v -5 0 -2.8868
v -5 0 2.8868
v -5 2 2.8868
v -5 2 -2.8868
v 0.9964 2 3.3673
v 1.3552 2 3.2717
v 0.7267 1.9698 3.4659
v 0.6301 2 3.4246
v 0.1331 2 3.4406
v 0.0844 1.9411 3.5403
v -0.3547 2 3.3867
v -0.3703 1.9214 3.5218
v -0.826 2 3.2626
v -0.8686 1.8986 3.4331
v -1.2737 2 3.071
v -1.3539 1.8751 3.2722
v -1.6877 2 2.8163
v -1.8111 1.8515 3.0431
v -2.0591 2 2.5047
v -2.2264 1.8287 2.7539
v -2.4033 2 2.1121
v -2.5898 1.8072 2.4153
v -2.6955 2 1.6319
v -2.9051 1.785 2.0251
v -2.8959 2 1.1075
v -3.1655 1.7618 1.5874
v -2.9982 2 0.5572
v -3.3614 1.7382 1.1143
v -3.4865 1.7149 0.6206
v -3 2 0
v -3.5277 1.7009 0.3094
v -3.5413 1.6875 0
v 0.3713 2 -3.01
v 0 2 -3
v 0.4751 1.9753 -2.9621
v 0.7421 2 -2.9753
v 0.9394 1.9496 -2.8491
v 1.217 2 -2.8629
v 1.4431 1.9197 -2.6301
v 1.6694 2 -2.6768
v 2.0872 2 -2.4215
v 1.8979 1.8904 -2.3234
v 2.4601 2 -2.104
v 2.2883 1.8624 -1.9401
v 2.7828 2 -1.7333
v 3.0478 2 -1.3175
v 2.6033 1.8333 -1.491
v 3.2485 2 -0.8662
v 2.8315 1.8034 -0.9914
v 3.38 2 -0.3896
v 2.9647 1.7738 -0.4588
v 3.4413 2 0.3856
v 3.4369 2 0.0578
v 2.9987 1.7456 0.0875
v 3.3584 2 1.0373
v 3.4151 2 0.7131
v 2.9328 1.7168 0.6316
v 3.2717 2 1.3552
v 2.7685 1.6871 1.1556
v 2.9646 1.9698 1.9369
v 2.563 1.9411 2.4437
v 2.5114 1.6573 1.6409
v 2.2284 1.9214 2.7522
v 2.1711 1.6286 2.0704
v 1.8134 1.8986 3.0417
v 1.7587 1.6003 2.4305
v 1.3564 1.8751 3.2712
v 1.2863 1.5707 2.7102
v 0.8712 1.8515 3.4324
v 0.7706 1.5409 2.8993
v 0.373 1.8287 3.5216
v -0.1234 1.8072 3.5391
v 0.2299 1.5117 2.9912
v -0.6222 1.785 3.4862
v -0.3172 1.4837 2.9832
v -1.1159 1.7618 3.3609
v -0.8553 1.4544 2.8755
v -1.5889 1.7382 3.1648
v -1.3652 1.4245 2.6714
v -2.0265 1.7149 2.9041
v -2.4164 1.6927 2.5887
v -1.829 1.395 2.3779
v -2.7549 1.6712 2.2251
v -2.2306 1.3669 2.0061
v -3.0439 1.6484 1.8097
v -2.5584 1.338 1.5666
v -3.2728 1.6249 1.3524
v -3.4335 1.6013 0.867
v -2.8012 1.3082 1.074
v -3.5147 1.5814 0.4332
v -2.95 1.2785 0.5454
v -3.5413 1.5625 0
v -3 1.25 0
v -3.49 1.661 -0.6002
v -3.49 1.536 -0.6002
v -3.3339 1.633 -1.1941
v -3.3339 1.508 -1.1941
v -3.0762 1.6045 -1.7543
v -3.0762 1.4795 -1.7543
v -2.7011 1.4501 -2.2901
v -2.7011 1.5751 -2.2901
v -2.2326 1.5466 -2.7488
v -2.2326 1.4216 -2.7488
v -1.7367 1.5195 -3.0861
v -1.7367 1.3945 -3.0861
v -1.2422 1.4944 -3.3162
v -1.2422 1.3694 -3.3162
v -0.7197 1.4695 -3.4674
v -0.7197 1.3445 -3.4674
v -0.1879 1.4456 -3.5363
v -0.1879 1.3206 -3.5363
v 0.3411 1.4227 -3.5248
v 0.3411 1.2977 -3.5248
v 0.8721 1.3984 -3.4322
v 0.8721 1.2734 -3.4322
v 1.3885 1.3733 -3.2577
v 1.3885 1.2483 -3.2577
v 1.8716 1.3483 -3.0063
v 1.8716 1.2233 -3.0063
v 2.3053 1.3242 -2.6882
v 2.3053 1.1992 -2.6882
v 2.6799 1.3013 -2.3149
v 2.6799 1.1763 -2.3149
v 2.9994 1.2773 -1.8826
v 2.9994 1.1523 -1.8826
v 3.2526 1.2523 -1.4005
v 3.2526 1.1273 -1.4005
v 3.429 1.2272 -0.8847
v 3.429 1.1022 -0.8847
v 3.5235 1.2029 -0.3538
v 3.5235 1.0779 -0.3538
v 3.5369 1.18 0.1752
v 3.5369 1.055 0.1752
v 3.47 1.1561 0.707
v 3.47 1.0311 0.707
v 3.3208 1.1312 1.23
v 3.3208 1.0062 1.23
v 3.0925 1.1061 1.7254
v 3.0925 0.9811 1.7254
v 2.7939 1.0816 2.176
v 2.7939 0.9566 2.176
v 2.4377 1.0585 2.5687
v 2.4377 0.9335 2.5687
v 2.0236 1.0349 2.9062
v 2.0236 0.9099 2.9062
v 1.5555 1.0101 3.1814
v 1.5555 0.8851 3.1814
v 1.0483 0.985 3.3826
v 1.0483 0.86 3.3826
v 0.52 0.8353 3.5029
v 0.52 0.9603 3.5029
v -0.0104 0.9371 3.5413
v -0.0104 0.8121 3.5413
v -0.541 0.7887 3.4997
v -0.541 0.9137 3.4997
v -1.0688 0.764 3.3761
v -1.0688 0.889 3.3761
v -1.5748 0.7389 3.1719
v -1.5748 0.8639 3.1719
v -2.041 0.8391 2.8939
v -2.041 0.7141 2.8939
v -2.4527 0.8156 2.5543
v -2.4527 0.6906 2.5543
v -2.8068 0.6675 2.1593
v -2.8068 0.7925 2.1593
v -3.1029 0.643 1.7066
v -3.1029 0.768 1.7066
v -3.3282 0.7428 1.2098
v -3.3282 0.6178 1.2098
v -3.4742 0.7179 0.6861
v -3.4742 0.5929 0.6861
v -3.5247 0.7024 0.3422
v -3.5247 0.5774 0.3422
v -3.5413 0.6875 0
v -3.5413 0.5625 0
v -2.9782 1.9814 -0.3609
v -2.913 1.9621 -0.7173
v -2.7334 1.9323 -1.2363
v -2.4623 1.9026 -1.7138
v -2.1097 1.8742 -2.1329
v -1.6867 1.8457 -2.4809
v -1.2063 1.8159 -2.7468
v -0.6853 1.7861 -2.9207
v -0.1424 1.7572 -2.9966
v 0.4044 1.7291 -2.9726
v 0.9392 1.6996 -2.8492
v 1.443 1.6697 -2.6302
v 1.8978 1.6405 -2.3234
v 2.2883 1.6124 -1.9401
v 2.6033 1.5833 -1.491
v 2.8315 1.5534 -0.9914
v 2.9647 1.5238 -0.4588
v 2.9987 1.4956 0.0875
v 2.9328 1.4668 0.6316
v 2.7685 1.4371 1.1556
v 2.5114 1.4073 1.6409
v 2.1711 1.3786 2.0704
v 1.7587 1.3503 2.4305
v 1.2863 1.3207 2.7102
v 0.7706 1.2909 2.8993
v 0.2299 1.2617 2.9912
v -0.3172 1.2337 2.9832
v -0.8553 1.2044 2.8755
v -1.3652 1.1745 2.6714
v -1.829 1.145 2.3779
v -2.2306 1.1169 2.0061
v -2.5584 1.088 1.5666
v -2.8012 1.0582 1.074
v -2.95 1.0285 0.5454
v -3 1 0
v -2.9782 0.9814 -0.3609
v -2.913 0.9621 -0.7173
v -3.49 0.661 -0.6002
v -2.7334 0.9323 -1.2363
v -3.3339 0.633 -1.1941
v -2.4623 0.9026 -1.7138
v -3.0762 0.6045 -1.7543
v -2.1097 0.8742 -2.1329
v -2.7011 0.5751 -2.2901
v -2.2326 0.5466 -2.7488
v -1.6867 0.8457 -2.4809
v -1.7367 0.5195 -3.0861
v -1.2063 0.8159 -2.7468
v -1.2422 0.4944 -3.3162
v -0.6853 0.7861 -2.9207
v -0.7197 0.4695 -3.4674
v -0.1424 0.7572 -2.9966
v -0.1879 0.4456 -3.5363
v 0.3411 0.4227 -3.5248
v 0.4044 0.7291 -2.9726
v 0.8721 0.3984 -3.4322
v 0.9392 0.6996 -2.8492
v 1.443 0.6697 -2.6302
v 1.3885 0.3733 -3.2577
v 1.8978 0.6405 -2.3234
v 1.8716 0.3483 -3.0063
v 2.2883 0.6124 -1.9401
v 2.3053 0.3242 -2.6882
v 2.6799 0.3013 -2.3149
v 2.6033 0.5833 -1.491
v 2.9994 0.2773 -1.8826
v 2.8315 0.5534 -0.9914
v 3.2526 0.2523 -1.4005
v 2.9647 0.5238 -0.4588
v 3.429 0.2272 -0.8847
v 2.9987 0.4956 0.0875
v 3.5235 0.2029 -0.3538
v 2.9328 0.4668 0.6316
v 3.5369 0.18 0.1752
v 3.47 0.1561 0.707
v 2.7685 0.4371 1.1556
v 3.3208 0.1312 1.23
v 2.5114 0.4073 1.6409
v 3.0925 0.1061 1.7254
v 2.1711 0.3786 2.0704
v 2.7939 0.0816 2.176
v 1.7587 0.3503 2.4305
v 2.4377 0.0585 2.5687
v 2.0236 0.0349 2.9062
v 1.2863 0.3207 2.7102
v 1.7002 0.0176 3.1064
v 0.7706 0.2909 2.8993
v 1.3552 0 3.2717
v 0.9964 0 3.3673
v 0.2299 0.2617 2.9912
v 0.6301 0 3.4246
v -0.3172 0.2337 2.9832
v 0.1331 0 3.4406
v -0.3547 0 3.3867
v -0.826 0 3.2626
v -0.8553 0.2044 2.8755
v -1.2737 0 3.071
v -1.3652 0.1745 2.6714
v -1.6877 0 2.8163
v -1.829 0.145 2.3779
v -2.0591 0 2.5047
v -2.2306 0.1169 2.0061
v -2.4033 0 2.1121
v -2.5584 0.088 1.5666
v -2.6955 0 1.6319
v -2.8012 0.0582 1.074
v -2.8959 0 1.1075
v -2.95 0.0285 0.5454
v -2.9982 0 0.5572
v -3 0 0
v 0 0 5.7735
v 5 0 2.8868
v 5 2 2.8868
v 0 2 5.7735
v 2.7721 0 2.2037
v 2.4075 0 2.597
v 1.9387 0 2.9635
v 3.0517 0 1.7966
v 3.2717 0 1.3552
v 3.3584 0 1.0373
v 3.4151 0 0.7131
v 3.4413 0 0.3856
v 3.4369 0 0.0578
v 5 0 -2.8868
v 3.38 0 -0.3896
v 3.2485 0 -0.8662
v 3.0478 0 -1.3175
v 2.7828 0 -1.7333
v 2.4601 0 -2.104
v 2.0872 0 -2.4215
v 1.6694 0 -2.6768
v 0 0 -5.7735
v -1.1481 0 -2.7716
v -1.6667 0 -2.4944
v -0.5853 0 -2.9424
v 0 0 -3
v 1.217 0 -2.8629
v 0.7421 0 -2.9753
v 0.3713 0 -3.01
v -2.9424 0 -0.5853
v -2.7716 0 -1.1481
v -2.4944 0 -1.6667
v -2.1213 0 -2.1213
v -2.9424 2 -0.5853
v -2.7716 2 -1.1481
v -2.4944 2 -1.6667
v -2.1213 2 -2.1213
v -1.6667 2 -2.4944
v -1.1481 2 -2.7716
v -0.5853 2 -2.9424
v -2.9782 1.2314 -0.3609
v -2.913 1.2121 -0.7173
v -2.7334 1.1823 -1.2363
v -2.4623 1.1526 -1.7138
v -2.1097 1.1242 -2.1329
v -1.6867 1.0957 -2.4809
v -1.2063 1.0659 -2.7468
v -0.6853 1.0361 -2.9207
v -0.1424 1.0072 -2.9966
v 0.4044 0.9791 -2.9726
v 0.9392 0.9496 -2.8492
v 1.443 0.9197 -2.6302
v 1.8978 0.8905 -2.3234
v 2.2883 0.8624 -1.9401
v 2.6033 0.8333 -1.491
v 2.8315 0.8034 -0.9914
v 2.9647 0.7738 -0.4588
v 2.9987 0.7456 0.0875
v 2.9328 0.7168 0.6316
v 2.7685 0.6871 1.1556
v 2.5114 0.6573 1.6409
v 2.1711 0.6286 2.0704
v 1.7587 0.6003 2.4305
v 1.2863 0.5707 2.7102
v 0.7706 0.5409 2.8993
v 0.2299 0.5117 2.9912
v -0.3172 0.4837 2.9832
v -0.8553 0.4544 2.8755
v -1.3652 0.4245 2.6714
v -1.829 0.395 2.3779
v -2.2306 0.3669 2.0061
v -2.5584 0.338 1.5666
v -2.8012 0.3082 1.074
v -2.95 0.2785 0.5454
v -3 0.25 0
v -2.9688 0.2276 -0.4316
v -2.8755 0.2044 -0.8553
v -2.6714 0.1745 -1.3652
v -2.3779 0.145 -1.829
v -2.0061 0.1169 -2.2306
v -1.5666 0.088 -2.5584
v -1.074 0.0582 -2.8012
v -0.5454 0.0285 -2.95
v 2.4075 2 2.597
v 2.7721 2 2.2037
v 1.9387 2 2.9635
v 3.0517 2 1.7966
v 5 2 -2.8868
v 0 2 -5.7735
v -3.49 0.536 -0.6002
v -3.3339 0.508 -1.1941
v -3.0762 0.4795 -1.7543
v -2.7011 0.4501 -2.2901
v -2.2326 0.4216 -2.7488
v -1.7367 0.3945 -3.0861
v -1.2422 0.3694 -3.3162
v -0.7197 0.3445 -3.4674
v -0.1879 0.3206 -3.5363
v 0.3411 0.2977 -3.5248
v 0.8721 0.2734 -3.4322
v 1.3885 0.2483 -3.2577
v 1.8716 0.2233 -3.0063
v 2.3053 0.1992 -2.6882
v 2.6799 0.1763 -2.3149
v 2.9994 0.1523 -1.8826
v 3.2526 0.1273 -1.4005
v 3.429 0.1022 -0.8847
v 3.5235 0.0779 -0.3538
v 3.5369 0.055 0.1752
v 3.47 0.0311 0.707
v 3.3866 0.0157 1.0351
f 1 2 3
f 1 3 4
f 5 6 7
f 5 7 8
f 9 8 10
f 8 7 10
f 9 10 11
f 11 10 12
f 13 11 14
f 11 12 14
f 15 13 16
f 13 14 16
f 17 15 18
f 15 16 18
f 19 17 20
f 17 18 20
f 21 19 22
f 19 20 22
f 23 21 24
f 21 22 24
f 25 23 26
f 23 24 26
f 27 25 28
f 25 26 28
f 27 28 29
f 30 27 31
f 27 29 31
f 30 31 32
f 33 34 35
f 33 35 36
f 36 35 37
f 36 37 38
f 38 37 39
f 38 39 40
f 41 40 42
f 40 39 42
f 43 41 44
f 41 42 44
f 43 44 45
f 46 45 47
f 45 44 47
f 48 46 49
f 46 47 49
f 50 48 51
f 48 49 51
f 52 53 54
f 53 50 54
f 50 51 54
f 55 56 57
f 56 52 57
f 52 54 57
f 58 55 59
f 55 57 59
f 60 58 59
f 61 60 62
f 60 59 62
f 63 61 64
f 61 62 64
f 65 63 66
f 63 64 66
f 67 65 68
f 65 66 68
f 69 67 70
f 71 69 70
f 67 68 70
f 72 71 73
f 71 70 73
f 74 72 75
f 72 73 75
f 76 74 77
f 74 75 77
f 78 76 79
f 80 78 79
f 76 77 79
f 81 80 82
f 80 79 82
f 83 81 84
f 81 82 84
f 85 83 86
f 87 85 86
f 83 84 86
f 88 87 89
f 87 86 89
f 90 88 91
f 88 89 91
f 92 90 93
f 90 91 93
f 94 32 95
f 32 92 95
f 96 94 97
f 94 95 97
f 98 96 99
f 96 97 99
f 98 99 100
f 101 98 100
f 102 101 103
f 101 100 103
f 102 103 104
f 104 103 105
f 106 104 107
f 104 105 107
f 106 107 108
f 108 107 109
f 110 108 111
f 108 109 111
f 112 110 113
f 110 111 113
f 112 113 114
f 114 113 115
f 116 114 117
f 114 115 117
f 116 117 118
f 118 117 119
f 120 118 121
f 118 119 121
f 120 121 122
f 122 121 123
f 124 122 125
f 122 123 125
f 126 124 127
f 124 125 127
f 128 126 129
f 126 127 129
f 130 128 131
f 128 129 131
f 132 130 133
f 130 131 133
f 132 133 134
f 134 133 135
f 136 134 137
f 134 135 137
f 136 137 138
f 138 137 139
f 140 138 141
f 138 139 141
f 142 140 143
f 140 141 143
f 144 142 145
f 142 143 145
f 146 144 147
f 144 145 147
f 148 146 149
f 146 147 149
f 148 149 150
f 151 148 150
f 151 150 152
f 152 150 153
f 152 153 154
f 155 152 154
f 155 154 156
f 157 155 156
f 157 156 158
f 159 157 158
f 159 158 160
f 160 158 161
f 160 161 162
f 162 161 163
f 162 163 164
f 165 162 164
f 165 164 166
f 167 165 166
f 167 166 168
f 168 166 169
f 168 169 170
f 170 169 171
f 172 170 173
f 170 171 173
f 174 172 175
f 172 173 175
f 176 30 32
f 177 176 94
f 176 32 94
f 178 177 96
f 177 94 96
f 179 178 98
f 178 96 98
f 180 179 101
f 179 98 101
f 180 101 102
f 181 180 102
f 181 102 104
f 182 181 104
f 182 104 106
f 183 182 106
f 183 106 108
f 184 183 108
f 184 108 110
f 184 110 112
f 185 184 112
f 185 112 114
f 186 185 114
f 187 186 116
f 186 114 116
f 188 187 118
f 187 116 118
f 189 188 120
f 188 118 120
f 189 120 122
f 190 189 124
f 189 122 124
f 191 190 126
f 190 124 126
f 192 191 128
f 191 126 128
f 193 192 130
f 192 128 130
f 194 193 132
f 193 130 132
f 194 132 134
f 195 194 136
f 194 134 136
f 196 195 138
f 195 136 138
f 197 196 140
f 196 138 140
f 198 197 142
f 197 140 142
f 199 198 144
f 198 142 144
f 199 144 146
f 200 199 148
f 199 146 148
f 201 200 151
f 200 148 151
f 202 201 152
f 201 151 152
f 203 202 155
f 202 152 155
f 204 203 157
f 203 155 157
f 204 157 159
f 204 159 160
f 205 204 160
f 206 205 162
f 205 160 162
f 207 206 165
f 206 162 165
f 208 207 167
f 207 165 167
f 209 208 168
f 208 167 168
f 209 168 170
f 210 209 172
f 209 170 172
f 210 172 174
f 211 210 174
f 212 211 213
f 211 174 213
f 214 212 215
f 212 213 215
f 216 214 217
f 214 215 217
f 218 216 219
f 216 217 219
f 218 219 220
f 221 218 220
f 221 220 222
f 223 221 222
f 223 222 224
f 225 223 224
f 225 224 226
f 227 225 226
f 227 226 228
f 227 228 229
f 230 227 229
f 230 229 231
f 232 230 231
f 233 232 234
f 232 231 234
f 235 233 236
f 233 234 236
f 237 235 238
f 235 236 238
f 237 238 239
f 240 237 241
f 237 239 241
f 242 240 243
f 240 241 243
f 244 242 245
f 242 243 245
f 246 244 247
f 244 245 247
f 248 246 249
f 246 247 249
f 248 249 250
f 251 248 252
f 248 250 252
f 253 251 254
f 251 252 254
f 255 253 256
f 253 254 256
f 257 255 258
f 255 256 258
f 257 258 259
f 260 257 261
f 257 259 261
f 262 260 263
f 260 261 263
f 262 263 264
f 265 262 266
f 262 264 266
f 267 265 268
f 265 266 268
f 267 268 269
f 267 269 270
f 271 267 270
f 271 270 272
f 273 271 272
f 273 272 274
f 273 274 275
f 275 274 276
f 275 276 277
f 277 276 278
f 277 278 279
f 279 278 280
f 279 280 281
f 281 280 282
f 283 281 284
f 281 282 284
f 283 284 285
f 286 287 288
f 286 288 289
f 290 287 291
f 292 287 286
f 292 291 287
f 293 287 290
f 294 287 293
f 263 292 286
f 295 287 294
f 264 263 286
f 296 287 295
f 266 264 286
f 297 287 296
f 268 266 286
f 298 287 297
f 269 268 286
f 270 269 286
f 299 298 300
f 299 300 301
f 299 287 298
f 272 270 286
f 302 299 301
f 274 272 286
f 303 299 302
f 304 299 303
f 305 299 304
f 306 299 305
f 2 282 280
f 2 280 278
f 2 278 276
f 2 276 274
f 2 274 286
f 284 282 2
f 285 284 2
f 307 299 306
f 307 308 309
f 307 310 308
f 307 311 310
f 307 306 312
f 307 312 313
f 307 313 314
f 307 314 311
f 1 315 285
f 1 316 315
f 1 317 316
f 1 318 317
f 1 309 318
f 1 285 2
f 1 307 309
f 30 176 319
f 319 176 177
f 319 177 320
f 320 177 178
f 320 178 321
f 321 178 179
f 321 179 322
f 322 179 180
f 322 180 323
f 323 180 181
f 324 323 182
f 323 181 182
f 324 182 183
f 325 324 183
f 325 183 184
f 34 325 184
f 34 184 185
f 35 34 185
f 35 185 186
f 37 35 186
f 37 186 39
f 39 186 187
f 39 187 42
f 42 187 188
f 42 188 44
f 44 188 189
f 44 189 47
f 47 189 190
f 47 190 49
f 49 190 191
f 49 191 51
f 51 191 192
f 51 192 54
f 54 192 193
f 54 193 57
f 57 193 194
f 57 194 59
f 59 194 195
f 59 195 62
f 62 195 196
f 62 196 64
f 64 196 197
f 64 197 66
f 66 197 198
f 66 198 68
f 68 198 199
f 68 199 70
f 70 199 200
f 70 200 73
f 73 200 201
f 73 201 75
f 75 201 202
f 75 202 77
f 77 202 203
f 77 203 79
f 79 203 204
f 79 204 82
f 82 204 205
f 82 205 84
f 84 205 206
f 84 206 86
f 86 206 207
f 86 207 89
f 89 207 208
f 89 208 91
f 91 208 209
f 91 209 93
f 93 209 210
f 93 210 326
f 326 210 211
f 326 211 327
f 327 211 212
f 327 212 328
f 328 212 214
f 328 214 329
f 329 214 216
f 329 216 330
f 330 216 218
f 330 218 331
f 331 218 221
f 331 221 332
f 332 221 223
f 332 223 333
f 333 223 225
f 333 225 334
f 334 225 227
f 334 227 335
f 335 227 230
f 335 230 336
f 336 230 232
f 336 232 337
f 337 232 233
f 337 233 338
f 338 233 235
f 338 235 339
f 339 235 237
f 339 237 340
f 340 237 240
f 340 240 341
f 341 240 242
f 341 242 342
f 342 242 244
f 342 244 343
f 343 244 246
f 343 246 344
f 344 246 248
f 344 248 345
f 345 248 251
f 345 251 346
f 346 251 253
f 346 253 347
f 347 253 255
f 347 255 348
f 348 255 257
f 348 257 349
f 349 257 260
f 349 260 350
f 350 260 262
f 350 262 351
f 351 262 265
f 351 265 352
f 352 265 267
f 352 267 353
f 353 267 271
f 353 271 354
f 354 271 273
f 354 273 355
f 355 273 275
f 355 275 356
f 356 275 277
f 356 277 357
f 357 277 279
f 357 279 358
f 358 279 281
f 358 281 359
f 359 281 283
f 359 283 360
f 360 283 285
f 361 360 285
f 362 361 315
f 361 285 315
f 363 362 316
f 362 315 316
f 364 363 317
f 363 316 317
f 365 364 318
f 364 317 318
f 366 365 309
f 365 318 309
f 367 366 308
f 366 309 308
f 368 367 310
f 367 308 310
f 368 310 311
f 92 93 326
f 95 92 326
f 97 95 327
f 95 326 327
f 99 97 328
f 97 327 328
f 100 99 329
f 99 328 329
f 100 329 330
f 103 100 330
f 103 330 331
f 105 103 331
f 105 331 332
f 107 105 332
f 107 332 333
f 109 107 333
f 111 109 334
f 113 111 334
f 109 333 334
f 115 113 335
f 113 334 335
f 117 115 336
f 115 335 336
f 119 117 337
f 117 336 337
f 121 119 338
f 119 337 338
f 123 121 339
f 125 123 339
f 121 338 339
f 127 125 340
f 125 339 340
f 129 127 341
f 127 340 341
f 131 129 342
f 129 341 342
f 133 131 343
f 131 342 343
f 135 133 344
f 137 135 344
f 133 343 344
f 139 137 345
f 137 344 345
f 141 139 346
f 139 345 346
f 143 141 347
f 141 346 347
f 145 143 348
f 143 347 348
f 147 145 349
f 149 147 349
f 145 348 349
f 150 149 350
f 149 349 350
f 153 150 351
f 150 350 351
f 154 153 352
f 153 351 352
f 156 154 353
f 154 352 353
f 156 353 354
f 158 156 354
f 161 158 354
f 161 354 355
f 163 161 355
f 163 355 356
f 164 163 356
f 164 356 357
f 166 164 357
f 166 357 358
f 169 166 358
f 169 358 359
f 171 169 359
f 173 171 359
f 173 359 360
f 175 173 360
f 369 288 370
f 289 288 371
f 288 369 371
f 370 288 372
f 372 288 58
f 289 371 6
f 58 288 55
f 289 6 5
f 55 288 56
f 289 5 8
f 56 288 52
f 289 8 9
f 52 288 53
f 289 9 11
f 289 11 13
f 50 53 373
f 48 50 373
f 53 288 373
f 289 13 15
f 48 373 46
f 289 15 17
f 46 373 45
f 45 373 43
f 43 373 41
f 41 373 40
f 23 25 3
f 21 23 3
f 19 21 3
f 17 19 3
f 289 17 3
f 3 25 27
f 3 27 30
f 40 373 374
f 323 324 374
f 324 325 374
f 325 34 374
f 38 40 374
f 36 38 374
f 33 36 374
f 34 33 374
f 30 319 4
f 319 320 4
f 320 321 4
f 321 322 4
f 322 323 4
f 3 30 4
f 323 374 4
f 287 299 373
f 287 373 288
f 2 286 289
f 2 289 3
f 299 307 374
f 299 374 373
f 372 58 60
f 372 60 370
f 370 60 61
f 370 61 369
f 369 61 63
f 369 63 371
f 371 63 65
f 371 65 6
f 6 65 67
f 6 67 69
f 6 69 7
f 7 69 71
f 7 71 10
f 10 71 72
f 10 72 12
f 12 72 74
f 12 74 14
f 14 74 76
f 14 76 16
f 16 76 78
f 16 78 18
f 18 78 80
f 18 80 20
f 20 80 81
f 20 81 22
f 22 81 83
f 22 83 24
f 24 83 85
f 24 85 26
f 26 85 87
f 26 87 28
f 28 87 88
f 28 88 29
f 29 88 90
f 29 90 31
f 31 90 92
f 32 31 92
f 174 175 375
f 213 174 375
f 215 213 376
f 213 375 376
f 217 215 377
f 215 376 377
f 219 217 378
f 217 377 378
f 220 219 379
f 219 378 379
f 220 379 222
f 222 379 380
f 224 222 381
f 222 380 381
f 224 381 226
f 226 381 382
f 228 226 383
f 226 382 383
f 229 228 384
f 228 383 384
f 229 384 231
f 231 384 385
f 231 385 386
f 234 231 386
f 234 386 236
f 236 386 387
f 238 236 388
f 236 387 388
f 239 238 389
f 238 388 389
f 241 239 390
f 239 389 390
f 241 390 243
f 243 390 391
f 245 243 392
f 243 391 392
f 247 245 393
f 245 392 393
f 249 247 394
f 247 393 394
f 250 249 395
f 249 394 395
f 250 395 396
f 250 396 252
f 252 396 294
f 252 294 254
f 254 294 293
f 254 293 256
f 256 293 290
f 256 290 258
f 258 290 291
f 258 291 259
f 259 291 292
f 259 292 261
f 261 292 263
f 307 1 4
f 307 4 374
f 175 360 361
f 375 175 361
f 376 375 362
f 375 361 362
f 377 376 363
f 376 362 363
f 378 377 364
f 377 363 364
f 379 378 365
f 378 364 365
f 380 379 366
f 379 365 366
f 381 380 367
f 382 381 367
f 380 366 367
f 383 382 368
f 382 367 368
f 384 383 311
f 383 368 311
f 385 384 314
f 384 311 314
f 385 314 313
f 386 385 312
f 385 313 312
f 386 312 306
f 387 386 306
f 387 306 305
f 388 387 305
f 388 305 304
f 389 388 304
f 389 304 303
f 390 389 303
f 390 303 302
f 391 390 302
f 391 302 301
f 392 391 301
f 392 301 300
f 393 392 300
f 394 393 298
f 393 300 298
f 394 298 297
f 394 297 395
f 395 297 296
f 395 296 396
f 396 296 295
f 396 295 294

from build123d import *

# Parameters (mm, degrees)
SKETCH_1_R      = 2.5
EXTRUDE_1_DEPTH = 2
M7X1_02_D       = 6
M7X1_02_DEPTH   = 10
M7X1_02_TIP     = 1.802581857
THREAD_2_PITCH  = 1


with BuildPart() as part:
    # Эскиз1 → Бобышка-Вытянуть1 (new body)
    with BuildSketch(Plane(origin=(0, 0, 0), x_dir=(1, 0, 0), z_dir=(0, 1, 0))):
        Polygon((-5, -2.886751346), (-5, 2.886751346), (0, 5.773502692), (5, 2.886751346), (5, -2.886751346), (0, -5.773502692), align=None)
        with Locations(Location((0, 0, 0), (0, 0, 270))):
            Circle(SKETCH_1_R, mode=Mode.SUBTRACT)
    extrude(amount=EXTRUDE_1_DEPTH)

    # Сверление под метчик M7x1.02
    with Locations(Plane(origin=(0, 2, 0), x_dir=(1, 0, 0), z_dir=(0, 1, 0))):
        with Locations((0, 0)):
            Hole(M7X1_02_D / 2, depth=M7X1_02_DEPTH)
            with Locations((0, 0, -(M7X1_02_DEPTH + M7X1_02_TIP / 2))):  # 118° drill point
                Cone(0, M7X1_02_D / 2, M7X1_02_TIP, mode=Mode.SUBTRACT)

    # Резьба2: the profile of Профиль резьбы2 profile screwed along a right-hand helix of 5 turns, 8 arcs to a turn; built about Z, then put on its axis
    thread_2_z = Axis((0, 0, 0), (0, 0, 1))
    thread_2_corners = [(2.9997, 0, -0.000173205), (3.541265875, 0, 0.312499999), (3.541265875, 0, 0.437499999), (2.9997, 0, 0.750173202)]
    with BuildLine(mode=Mode.PRIVATE) as thread_2_profile:
        Line(thread_2_corners[0], thread_2_corners[1])
        Line(thread_2_corners[1], thread_2_corners[2])
        Line(thread_2_corners[2], thread_2_corners[3])
        Line(thread_2_corners[3], thread_2_corners[0])
    thread_2_cap = Face(thread_2_profile.wire())
    thread_2_turn_angles = [0, 22.5, 45, 67.5, 90, 112.5, 135, 157.5, 180, 202.5, 225, 247.5, 270, 292.5, 315, 337.5, 360]
    thread_2_turn_weights = [1, 0.9238795325112867, 1, 0.9238795325112867, 1, 0.9238795325112867, 1, 0.9238795325112867, 1, 0.9238795325112867, 1, 0.9238795325112867, 1, 0.9238795325112867, 1, 0.9238795325112867, 1]
    thread_2_turn_rails = [Edge.make_bspline([Vector(p[0], p[1], 0).rotate(thread_2_z, thread_2_turn_angles[k]) / thread_2_turn_weights[k] + Vector(0, 0, p[2] + THREAD_2_PITCH * thread_2_turn_angles[k] / 360) for k in range(17)], [0, 0, 0, 1, 1, 2, 2, 3, 3, 4, 4, 5, 5, 6, 6, 7, 7, 8, 8, 8], 2, thread_2_turn_weights) for p in thread_2_corners]
    thread_2_turn_sides = [Face.make_surface_from_curves(thread_2_turn_rails[p[0]], thread_2_turn_rails[p[1]]) for p in [(0, 1), (1, 2), (2, 3), (3, 0)]]
    thread_2 = Plane(origin=(0, 3, 0), x_dir=(-1, 0, 0), z_dir=(0, -1, 0)) * Solid(Shell([*[p.moved(Location((0, 0, THREAD_2_PITCH * i))) for i in range(5) for p in thread_2_turn_sides], thread_2_cap, thread_2_cap.rotate(thread_2_z, 1800).moved(Location((0, 0, THREAD_2_PITCH * 1800 / 360)))]))
    add(thread_2, mode=Mode.SUBTRACT)


solid = part.part
